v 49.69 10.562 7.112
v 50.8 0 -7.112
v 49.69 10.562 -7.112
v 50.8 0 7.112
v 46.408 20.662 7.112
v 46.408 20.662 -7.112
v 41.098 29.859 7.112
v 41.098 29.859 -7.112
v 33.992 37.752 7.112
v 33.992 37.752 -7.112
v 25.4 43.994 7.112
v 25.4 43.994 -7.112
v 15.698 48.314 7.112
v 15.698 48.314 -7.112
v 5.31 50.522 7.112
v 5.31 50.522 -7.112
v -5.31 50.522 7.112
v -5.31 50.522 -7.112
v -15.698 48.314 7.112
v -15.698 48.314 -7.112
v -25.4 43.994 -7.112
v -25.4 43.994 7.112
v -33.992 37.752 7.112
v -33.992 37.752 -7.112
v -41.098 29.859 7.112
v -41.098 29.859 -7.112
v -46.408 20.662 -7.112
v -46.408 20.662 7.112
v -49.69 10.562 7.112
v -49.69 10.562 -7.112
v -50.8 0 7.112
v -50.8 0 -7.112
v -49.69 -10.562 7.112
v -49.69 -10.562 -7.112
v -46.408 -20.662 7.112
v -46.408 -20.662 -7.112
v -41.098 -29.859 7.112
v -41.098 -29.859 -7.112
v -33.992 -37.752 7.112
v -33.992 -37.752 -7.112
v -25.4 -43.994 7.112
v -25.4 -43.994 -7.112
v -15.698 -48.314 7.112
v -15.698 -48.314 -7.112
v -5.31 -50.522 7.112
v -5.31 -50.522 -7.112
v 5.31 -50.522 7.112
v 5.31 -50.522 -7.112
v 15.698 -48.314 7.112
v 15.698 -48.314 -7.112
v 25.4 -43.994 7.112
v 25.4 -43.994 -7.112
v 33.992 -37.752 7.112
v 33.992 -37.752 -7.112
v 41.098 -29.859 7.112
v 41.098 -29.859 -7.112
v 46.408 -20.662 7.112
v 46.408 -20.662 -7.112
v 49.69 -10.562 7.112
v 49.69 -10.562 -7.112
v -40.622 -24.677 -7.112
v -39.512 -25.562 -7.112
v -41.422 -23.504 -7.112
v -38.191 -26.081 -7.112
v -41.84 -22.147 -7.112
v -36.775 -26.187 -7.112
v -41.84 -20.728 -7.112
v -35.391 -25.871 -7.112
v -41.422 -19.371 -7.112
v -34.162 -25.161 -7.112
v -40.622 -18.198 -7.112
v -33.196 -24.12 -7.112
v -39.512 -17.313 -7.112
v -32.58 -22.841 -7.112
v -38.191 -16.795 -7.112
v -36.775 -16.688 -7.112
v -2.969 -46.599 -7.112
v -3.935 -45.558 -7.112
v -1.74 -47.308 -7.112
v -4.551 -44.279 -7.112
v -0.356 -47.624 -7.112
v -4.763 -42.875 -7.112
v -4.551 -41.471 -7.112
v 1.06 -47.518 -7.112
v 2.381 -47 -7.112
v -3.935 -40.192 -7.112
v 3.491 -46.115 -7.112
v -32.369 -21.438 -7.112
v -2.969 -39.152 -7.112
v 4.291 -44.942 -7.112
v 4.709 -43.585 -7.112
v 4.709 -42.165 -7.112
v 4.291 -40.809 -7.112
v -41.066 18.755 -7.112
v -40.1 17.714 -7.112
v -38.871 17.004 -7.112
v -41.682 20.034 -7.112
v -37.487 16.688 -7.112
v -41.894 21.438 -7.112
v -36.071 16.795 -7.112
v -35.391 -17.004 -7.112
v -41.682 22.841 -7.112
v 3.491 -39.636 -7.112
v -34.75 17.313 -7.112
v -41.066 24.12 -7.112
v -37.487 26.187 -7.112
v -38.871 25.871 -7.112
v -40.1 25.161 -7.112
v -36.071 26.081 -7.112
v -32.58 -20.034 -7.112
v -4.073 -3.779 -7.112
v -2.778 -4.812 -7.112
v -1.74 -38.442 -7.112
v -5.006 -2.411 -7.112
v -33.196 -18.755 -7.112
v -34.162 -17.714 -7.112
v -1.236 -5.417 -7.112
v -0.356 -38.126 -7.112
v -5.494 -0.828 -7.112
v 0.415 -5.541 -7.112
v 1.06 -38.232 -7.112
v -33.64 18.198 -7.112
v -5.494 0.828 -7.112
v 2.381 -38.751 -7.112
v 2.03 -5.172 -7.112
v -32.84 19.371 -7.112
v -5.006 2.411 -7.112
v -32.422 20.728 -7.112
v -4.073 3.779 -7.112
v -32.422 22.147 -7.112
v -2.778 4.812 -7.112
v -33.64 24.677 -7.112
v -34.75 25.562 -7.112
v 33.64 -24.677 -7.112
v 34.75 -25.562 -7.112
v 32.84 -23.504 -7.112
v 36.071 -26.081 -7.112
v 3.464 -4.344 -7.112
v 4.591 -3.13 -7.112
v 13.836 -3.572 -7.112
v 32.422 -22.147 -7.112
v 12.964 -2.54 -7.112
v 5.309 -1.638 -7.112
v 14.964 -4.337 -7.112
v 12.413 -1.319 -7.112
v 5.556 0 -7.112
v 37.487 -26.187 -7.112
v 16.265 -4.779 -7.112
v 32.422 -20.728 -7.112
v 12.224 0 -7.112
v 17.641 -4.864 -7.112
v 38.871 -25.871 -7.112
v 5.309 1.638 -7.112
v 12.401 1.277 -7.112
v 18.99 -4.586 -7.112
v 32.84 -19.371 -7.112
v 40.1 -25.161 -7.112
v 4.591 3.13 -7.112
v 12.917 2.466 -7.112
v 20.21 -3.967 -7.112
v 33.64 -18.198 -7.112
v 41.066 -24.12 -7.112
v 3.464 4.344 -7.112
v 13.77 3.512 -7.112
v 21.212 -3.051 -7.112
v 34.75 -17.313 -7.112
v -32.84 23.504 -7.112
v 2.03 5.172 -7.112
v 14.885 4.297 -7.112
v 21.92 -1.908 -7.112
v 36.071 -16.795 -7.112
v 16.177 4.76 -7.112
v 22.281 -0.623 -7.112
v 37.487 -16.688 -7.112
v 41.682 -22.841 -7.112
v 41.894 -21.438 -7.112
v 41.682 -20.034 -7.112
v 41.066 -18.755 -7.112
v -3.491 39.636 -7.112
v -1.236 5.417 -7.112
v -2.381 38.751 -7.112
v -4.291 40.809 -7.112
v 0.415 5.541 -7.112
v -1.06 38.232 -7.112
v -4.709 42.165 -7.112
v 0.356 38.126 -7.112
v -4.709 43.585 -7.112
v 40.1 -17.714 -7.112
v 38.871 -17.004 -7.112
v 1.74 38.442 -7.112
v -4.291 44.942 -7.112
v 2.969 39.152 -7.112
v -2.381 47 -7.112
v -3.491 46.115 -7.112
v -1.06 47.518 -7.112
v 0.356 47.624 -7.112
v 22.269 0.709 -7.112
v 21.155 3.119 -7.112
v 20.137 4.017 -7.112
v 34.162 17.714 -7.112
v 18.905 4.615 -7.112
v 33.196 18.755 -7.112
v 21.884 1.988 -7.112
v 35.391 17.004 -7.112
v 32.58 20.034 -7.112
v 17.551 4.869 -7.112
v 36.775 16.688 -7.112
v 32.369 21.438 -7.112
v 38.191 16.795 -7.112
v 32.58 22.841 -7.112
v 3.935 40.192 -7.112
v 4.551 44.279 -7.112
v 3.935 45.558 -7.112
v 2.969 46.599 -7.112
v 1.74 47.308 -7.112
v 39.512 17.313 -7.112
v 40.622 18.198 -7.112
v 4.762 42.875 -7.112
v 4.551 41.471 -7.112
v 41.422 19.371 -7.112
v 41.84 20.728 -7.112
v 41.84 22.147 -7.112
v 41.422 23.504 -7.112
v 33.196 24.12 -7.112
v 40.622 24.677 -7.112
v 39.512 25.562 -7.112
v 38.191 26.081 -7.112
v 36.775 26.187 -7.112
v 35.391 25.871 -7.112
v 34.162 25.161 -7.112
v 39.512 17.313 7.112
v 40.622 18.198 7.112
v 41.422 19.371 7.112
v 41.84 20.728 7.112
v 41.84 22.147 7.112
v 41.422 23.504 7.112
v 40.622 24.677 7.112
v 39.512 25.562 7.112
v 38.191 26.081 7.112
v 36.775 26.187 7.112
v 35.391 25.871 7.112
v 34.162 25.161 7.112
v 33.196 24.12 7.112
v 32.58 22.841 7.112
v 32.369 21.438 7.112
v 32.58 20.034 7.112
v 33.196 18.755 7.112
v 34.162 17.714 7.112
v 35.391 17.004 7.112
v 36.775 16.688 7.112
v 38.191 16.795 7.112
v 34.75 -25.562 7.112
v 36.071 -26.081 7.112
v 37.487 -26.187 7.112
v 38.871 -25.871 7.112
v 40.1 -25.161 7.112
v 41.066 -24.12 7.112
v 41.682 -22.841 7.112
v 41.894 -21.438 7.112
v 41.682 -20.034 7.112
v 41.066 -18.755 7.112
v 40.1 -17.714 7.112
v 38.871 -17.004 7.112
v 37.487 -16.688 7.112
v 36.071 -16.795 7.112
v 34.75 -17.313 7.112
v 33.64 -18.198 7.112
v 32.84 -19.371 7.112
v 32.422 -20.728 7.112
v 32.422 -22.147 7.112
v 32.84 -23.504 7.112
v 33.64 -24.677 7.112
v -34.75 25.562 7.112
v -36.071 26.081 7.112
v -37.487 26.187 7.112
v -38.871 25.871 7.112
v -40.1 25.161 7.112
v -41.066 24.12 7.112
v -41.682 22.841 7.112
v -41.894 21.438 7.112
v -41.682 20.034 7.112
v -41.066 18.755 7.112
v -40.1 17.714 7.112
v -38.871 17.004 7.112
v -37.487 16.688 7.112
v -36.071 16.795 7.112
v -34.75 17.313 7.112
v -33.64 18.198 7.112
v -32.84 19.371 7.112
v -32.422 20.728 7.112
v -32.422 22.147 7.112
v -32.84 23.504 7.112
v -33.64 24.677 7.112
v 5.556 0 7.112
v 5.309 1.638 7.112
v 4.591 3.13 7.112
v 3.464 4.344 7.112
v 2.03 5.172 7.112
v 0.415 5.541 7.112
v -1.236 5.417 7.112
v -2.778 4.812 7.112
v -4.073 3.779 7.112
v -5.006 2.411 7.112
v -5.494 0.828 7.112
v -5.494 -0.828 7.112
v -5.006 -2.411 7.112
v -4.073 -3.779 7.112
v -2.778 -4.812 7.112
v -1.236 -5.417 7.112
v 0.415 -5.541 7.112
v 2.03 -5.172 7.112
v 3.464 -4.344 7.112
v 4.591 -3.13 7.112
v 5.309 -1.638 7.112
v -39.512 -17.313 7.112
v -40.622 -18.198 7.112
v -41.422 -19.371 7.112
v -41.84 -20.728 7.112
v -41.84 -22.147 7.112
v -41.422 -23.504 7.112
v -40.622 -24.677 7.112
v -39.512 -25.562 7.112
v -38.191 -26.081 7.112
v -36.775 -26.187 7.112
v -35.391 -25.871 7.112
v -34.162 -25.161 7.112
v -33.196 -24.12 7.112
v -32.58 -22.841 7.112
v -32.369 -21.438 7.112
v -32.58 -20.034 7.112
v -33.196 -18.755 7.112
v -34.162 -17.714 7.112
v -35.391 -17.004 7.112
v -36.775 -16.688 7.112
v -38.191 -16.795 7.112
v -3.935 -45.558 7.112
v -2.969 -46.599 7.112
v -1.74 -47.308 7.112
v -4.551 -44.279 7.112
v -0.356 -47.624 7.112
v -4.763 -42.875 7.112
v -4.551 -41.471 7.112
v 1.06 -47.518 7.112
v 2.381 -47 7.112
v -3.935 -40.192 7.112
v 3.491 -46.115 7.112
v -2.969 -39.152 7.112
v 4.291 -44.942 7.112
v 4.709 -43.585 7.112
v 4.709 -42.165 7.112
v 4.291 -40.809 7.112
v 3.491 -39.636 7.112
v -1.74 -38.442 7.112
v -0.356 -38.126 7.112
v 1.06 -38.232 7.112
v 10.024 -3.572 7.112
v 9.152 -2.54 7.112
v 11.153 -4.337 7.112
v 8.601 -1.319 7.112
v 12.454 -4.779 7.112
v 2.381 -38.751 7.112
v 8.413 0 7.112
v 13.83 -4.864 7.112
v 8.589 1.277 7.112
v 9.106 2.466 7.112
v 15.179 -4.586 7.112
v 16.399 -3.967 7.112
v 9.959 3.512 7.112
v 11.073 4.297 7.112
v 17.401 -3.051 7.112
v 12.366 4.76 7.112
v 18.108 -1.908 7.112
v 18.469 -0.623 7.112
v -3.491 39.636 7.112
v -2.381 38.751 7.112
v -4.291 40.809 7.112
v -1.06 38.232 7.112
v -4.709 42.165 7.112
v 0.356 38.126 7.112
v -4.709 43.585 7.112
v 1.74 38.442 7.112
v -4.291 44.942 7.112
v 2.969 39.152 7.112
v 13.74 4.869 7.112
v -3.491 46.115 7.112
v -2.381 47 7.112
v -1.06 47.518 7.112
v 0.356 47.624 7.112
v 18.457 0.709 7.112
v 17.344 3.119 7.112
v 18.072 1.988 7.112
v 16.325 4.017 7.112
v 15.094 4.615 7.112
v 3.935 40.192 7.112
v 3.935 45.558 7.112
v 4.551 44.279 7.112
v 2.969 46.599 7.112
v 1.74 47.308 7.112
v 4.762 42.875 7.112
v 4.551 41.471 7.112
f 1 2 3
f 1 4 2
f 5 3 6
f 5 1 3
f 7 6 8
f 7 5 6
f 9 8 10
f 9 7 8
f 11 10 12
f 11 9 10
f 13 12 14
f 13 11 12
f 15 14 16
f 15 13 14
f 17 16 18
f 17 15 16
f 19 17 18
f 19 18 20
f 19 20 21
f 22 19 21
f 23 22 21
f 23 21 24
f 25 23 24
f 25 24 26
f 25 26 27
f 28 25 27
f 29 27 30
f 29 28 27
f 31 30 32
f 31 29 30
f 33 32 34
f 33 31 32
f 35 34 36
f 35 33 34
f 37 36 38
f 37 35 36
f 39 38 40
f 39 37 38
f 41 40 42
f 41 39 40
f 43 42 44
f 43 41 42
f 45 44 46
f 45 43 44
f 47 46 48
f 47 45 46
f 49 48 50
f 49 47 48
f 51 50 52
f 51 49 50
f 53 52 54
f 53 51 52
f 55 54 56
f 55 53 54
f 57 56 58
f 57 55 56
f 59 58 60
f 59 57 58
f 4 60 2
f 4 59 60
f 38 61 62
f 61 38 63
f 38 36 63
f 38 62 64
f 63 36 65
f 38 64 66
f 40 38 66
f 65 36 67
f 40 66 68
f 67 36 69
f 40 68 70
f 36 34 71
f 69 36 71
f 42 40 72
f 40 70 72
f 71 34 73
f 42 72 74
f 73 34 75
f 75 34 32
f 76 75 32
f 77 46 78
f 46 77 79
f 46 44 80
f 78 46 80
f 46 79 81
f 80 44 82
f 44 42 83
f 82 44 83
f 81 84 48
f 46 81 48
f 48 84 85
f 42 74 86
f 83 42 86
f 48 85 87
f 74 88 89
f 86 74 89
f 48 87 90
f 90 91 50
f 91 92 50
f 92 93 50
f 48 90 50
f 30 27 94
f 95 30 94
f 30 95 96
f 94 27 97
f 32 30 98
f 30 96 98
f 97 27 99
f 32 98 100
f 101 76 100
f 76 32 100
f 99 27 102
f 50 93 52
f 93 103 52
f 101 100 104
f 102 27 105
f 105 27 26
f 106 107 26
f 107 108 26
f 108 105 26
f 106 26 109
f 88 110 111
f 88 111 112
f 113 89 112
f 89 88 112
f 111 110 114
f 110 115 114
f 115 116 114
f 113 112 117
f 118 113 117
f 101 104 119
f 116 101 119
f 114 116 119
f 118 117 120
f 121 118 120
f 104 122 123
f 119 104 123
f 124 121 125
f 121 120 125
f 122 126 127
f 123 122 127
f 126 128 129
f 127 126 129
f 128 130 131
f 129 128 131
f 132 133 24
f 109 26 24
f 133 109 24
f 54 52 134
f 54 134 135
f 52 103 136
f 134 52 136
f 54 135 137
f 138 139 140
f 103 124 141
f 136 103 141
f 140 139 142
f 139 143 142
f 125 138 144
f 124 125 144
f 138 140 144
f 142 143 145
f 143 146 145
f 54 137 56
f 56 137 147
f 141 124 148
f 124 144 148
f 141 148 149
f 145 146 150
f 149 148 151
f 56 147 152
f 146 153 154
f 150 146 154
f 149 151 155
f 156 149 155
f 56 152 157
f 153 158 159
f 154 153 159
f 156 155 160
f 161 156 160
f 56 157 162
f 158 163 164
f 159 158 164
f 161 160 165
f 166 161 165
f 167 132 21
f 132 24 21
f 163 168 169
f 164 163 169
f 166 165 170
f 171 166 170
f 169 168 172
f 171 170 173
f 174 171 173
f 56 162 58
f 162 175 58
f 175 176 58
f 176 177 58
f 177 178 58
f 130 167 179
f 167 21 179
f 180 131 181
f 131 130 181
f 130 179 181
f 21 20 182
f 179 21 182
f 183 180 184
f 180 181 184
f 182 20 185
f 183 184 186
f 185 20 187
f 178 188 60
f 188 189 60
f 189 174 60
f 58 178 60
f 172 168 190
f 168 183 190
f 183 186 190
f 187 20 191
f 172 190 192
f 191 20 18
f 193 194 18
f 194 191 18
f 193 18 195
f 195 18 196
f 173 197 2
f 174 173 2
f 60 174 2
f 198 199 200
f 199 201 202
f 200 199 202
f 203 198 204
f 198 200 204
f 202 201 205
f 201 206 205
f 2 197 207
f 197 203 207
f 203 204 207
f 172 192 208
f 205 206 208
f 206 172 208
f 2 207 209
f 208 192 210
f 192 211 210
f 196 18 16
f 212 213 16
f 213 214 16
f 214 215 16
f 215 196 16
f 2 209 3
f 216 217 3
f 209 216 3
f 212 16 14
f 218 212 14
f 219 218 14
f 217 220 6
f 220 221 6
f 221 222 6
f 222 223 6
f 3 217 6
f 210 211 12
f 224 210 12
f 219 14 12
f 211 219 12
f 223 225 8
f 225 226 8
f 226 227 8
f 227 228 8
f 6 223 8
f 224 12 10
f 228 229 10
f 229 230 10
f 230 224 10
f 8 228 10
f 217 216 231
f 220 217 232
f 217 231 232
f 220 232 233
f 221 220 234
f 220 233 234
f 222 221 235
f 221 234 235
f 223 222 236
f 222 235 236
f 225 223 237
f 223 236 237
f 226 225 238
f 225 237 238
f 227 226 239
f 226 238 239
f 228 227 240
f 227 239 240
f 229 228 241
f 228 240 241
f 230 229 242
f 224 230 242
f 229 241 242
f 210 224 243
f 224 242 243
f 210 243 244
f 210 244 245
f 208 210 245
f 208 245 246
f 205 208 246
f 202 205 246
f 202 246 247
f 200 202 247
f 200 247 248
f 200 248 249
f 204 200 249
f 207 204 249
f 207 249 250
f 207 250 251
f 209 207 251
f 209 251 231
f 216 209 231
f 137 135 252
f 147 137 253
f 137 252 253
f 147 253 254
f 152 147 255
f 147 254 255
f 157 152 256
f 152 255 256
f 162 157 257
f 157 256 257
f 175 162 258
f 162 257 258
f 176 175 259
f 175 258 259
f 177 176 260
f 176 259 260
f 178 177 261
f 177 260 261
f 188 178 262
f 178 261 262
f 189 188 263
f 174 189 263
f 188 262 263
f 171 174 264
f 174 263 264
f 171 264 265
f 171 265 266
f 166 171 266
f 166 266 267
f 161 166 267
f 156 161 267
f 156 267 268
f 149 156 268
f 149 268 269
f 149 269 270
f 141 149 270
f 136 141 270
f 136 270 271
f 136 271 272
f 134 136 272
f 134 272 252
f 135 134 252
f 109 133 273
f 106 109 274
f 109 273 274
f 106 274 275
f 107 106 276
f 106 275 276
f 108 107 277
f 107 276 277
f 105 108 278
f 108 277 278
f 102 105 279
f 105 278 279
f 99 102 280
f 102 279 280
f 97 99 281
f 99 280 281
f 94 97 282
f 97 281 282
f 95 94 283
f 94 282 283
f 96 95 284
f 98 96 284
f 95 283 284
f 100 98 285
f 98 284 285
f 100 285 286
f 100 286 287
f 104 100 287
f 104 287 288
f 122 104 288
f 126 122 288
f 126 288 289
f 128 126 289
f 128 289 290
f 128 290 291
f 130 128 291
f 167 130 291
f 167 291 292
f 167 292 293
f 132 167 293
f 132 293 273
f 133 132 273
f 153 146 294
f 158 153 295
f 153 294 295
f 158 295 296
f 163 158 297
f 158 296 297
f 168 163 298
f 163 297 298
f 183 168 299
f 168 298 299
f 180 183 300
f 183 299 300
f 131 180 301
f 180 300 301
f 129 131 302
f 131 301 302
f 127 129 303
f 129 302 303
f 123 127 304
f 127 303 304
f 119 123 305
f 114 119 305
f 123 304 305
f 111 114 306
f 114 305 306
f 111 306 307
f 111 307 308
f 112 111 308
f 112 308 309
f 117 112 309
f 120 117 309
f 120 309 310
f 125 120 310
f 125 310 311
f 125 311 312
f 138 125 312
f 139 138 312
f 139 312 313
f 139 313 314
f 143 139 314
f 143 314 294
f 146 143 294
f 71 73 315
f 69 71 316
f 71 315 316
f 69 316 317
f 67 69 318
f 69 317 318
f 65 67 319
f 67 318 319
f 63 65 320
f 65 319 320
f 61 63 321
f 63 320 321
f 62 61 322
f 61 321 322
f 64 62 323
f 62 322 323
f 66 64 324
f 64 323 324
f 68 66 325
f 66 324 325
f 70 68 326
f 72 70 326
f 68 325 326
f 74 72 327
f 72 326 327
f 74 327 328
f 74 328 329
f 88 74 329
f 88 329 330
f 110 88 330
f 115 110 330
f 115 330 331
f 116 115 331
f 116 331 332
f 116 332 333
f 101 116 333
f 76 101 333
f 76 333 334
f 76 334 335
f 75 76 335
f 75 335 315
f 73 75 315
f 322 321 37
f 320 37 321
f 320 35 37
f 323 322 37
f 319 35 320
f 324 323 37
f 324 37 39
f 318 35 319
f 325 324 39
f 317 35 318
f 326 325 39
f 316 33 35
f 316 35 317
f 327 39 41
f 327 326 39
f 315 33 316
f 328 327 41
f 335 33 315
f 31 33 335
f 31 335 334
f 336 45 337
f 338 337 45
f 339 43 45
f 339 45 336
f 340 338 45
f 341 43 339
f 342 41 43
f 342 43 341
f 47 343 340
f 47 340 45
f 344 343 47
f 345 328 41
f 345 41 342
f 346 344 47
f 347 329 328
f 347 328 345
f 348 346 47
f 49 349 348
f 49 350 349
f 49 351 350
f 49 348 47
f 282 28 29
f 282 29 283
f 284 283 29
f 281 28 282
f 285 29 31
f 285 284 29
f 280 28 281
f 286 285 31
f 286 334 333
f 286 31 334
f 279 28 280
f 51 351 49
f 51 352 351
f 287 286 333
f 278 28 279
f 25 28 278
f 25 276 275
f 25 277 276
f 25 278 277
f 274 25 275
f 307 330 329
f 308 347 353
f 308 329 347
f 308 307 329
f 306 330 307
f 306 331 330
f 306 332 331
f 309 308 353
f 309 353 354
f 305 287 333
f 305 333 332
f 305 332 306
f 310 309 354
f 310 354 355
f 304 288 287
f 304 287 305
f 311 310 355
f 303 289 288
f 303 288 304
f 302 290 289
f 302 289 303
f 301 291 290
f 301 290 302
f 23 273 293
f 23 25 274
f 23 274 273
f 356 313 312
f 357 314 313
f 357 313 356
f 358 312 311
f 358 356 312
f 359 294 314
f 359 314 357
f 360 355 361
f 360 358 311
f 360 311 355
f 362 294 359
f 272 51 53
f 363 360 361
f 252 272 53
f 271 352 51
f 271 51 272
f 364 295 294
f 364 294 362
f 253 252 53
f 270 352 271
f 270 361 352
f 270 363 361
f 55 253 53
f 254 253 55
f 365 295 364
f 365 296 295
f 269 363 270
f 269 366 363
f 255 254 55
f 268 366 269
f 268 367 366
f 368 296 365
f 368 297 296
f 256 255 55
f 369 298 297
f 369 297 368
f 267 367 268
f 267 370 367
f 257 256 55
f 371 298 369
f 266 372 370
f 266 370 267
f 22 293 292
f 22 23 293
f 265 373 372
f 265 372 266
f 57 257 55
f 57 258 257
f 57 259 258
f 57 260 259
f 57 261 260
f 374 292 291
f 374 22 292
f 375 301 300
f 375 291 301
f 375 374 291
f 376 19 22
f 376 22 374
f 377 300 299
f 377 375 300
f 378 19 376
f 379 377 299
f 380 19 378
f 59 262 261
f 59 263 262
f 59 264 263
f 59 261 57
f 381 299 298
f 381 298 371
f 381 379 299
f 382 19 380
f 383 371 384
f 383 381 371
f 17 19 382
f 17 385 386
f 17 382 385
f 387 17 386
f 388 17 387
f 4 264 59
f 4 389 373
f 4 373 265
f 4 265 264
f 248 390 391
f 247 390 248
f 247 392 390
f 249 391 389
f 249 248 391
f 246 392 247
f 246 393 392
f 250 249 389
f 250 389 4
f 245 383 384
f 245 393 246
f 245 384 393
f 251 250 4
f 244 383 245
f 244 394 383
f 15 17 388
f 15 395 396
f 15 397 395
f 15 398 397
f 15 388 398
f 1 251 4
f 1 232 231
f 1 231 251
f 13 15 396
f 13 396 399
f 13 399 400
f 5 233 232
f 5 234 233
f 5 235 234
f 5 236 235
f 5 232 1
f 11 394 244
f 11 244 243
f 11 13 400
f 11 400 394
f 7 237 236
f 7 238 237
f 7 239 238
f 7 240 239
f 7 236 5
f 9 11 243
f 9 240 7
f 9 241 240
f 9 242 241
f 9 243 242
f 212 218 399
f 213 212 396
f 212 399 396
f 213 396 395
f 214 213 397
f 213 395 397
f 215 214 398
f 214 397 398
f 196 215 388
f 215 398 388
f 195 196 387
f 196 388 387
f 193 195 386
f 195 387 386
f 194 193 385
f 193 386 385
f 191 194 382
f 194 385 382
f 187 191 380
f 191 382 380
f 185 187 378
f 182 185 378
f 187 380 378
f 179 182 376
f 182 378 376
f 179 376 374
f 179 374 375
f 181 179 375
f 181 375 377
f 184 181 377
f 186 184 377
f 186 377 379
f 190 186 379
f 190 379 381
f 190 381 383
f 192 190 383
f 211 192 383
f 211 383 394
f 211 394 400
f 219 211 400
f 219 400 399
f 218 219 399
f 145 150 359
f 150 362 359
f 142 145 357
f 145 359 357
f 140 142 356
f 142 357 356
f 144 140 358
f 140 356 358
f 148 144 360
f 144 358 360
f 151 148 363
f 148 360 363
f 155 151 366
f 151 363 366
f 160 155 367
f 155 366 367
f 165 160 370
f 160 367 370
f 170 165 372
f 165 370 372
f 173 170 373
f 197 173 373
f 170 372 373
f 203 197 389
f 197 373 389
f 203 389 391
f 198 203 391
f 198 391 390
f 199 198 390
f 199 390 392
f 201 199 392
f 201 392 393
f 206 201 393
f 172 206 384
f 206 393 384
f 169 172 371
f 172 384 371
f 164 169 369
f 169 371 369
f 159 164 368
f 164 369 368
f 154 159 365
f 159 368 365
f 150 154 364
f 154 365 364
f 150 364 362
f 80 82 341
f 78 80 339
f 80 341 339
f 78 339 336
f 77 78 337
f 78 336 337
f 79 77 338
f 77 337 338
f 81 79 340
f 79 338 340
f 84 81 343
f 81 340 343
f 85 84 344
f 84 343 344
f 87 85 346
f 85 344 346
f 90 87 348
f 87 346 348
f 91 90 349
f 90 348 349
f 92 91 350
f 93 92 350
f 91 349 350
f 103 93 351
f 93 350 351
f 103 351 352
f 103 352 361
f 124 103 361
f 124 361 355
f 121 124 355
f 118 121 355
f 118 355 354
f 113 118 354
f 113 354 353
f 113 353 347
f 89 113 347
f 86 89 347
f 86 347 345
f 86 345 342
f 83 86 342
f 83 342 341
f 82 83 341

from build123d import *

# Parameters (mm, degrees)
SKETCH1_R           = 50.8
BOSS_EXTRUDE1_DEPTH = 7.112
SKETCH2_R           = 5.55625
CUT_EXTRUDE1_DEPTH  = 74.236617726
SKETCH3_R           = 4.7625
CUT_EXTRUDE2_DEPTH  = 74.236617726
CIRPATTERN1_COUNT   = 6
SKETCH5_R           = 4.8768
CUT_EXTRUDE3_DEPTH  = 25.4


with BuildPart() as part:
    # Sketch1 → Boss-Extrude1 (new, symmetric)
    with BuildSketch(Plane.XY):
        Circle(SKETCH1_R)
    extrude(amount=BOSS_EXTRUDE1_DEPTH, both=True)

    # Sketch2 → Cut-Extrude1 (cut, through all)
    with BuildSketch(Plane.XY.offset(7.112)):
        Circle(SKETCH2_R)
    extrude(amount=-CUT_EXTRUDE1_DEPTH, mode=Mode.SUBTRACT)

    # Sketch3 → Cut-Extrude2 (cut, through all)
    with BuildSketch(Plane.XY.offset(7.112)):
        with Locations((0, 42.8752)):
            Circle(SKETCH3_R)
    cut_extrude2 = extrude(amount=-CUT_EXTRUDE2_DEPTH, mode=Mode.SUBTRACT)

    # CirPattern1: Cut-Extrude2 ×6 about axis
    cirpattern1_axis = Axis((0, 0, -88.99), (0, 0, 1))
    for i in range(1, CIRPATTERN1_COUNT):
        add(cut_extrude2.rotate(cirpattern1_axis, i * 360 / CIRPATTERN1_COUNT), mode=Mode.SUBTRACT)

    # Sketch5 → Cut-Extrude3 (cut, symmetric)
    with BuildSketch(Plane(origin=(-0.876216993, 0, 3.270086336), x_dir=(0, -1, 0), z_dir=(-0.25881904510252135, 0, 0.9659258262890681))):
        with Locations((0, 14.844014522)):
            Circle(SKETCH5_R)
    extrude(amount=CUT_EXTRUDE3_DEPTH, both=True, mode=Mode.SUBTRACT)


solid = part.part
